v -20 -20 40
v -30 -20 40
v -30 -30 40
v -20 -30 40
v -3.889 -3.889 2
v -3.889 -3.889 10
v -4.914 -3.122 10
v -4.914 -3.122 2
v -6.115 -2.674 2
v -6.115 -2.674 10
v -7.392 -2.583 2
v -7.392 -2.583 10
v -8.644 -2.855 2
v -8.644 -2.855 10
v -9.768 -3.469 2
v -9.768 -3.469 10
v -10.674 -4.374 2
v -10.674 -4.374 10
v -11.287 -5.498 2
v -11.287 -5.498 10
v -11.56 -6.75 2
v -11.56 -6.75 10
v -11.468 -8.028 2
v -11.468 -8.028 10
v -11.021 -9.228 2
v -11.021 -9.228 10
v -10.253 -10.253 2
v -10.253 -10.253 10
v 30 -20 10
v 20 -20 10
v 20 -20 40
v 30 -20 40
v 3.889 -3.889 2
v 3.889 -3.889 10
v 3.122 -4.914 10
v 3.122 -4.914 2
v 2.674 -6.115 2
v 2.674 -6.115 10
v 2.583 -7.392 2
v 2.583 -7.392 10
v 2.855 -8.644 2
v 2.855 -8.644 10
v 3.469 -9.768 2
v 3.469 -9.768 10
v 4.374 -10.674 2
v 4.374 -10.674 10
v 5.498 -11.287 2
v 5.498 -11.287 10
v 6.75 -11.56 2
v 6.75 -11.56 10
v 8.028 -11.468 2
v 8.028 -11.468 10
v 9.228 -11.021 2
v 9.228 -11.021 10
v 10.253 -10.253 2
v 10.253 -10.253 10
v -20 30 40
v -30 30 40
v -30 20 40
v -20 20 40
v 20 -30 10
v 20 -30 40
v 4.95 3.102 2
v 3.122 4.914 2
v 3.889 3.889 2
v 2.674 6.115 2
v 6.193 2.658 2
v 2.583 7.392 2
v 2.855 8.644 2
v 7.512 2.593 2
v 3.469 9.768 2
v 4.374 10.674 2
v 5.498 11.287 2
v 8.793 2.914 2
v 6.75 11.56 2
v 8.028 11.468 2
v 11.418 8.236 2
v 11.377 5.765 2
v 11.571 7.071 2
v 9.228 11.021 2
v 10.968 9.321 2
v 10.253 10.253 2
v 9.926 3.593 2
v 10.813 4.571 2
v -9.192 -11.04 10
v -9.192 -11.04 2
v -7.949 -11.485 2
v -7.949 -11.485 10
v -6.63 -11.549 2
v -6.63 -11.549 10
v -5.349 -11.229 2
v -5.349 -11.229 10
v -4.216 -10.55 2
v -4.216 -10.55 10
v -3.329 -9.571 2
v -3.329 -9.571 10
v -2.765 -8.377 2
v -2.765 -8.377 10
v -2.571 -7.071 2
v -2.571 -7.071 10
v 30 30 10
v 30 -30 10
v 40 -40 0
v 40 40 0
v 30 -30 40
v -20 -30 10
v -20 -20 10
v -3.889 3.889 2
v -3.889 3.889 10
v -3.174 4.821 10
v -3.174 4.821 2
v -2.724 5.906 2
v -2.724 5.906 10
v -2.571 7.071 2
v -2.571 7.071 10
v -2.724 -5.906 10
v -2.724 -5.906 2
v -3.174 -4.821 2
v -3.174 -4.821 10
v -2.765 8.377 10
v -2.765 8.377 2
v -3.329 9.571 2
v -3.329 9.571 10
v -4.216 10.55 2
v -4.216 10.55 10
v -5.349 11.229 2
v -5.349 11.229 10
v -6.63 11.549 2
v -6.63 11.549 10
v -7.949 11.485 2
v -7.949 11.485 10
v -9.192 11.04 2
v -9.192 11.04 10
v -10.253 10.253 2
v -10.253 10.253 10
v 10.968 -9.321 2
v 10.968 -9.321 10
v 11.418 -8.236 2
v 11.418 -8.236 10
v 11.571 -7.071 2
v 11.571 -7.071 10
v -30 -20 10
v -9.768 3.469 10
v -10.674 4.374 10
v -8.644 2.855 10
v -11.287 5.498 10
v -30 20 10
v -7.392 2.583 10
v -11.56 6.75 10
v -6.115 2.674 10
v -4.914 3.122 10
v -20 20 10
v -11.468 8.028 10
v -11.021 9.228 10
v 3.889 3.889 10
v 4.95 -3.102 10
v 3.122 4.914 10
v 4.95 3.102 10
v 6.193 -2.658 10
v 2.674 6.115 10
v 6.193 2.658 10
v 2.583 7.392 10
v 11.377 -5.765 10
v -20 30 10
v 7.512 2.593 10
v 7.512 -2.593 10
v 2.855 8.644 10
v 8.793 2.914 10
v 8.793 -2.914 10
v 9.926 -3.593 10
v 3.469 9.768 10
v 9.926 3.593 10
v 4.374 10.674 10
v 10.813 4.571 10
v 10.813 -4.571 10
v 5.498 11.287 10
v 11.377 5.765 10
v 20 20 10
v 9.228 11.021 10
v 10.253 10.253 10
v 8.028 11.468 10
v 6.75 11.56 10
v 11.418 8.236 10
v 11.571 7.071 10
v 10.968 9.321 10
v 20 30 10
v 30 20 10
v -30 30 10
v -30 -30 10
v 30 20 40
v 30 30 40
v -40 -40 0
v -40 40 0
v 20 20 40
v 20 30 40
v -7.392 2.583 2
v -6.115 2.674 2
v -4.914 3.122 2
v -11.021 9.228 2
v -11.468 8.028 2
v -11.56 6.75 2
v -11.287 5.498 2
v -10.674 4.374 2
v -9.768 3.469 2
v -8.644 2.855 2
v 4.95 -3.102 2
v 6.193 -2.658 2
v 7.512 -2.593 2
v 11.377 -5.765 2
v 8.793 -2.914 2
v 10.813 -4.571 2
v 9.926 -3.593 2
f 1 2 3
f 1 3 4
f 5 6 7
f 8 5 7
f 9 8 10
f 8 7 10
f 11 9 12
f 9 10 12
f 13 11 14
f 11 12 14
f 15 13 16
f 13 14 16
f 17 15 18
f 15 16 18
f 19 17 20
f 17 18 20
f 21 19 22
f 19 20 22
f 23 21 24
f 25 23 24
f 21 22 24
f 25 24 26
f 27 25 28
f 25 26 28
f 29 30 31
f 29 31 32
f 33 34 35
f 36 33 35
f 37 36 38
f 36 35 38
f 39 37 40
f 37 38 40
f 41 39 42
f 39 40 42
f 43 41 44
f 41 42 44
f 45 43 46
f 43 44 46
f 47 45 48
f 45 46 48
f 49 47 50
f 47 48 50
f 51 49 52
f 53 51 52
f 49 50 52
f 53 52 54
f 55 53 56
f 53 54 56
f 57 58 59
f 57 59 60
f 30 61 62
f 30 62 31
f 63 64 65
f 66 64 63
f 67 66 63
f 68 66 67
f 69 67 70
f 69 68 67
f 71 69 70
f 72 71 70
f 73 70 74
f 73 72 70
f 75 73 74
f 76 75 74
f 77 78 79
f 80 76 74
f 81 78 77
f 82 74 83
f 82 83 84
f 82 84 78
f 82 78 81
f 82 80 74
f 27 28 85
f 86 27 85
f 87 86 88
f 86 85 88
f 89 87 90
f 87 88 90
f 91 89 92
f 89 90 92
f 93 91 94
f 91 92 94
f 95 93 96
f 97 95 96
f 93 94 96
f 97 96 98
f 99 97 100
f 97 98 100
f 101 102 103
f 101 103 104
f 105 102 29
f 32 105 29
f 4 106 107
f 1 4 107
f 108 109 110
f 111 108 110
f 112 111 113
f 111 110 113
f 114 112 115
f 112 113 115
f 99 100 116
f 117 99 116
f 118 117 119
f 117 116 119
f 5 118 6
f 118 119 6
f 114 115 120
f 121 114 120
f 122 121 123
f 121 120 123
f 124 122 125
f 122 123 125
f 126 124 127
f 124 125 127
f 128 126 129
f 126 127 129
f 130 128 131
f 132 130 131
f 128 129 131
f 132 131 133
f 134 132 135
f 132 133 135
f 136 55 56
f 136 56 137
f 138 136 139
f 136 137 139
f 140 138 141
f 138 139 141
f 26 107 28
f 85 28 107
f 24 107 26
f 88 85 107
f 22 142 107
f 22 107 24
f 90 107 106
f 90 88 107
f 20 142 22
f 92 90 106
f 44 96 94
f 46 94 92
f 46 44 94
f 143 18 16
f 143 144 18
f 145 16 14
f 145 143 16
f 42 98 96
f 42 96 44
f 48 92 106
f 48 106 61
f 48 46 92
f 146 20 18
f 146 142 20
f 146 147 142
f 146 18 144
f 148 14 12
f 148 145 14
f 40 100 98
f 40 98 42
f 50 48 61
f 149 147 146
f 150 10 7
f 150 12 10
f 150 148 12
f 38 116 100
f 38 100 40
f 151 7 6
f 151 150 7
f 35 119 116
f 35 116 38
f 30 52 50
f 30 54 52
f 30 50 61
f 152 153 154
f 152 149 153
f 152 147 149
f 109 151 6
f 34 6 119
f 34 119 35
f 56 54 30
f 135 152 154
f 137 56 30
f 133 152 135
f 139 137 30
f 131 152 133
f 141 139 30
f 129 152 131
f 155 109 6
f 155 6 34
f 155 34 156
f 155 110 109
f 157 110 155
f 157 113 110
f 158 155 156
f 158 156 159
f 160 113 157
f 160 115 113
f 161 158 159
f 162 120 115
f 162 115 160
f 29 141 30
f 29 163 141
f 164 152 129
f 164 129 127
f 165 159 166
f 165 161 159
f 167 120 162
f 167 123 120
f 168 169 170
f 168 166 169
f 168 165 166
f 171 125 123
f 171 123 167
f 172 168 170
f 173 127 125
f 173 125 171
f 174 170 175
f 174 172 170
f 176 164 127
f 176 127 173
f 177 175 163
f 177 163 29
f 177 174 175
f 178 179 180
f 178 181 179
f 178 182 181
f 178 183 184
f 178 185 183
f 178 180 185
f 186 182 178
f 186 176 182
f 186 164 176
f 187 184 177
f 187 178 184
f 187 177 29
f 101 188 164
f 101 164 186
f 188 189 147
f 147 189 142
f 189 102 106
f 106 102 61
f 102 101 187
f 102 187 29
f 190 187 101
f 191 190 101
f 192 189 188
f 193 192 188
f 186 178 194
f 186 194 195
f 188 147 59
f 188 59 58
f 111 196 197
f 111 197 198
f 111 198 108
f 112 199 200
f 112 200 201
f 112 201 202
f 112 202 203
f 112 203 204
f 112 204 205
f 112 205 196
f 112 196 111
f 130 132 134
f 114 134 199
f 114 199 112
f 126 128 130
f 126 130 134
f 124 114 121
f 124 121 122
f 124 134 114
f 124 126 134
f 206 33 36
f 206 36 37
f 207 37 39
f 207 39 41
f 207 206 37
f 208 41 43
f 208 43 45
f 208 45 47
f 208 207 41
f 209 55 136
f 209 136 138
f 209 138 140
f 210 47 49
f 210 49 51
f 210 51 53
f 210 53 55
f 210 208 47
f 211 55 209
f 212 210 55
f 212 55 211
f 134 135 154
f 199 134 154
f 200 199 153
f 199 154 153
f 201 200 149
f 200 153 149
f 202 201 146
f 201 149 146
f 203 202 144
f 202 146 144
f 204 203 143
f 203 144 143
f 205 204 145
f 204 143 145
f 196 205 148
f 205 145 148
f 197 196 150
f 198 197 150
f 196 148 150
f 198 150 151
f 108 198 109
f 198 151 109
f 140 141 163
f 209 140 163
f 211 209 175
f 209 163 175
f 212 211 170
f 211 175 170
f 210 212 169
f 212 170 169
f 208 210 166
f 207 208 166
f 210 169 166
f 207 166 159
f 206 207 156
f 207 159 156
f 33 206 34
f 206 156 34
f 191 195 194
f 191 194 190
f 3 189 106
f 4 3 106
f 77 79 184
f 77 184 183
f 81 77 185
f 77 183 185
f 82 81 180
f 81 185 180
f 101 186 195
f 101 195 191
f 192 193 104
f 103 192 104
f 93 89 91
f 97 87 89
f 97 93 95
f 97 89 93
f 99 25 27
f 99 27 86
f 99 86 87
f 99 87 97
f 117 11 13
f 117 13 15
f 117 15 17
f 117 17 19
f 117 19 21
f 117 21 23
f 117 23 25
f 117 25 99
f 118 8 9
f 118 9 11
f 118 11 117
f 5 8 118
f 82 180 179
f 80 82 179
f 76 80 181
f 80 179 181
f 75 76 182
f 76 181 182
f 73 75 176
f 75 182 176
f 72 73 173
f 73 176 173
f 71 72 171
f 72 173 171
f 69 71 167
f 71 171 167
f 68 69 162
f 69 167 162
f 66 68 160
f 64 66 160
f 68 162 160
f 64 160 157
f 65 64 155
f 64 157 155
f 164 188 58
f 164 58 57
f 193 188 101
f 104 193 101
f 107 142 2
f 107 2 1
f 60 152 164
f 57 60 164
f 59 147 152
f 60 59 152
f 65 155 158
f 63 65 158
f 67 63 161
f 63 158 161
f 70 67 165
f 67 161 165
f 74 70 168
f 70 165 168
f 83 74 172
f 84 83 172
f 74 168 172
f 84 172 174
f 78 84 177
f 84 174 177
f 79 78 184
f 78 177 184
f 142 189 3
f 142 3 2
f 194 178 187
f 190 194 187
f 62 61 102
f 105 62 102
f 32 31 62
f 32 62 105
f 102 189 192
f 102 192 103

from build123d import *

# Parameters (mm, degrees)
F0_W     = 80
F0_H     = 80
F1_DEPTH = 10
F2_SIZE2 = 9.99999
F2_SIZE  = 9.99999
F3_W     = 10
F3_H     = 10
F4_DEPTH = 30
F6_DEPTH = 8


# Not quite as in the source:
# - a fillet or chamfer is up to 0.001 mm smaller than in the source, because OpenCascade refuses the exact size


with BuildPart() as f1:
    # F0 (on Top) → F1 (new body)
    with BuildSketch(Plane.XY):
        Rectangle(F0_W, F0_H)
    extrude(amount=F1_DEPTH)

    # F2 (size 10 and 10 in the source; OpenCascade refuses exactly that, so slightly less here)
    f2_edges = [f1.edges().sort_by_distance(p)[0] for p in [
        (0, 40, 10),
        (-40, 0, 10),
        (0, -40, 10),
        (40, 0, 10),
    ]]
    chamfer(f2_edges, length=F2_SIZE, length2=F2_SIZE2)

    # F3 (on face) → F4 (join)
    with BuildSketch(Plane.XY.offset(10)):
        with Locations((-25, 25)):
            Rectangle(F3_W, F3_H)
        with Locations((-25, -25)):
            Rectangle(F3_W, F3_H)
        with Locations((25, 25)):
            Rectangle(F3_W, F3_H)
        with Locations((25, -25)):
            Rectangle(F3_W, F3_H)
    extrude(amount=F4_DEPTH)

    # F5 (on face) → F6 (cut)
    with BuildSketch(Plane.XY.offset(10)):
        with BuildLine():
            Line((-3.8890872965, 3.8890872965), (-10.2530483272, 10.2530483272))
            ThreePointArc((-10.2530483272, 10.2530483272), (-10.2530483272, 3.8890872965), (-3.8890872965, 3.8890872965))
        make_face()
        with BuildLine():
            ThreePointArc((-2.5710678119, 7.0710678119), (-5.3489923662, 11.2285257082), (-10.2530483272, 10.2530483272))
            Line((-10.2530483272, 10.2530483272), (-3.8890872965, 3.8890872965))
            ThreePointArc((-3.8890872965, 3.8890872965), (-2.9136099156, 5.3489923662), (-2.5710678119, 7.0710678119))
        make_face()
        with BuildLine():
            ThreePointArc((10.2530483272, 10.2530483272), (3.8890872965, 10.2530483272), (3.8890872965, 3.8890872965))
            Line((3.8890872965, 3.8890872965), (10.2530483272, 10.2530483272))
        make_face()
        with BuildLine():
            Line((10.2530483272, 10.2530483272), (3.8890872965, 3.8890872965))
            ThreePointArc((3.8890872965, 3.8890872965), (8.7931432575, 2.9136099156), (11.5710678119, 7.0710678119))
            ThreePointArc((11.5710678119, 7.0710678119), (11.2285257082, 8.7931432575), (10.2530483272, 10.2530483272))
        make_face()
        with BuildLine():
            Line((-10.2530483272, -10.2530483272), (-3.8890872965, -3.8890872965))
            ThreePointArc((-3.8890872965, -3.8890872965), (-10.2530483272, -3.8890872965), (-10.2530483272, -10.2530483272))
        make_face()
        with BuildLine():
            ThreePointArc((-2.5710678119, -7.0710678119), (-2.9136099156, -5.3489923662), (-3.8890872965, -3.8890872965))
            Line((-3.8890872965, -3.8890872965), (-10.2530483272, -10.2530483272))
            ThreePointArc((-10.2530483272, -10.2530483272), (-5.3489923662, -11.2285257082), (-2.5710678119, -7.0710678119))
        make_face()
        with BuildLine():
            Line((10.2530483272, -10.2530483272), (3.8890872965, -3.8890872965))
            ThreePointArc((3.8890872965, -3.8890872965), (3.8890872965, -10.2530483272), (10.2530483272, -10.2530483272))
        make_face()
        with BuildLine():
            ThreePointArc((11.5710678119, -7.0710678119), (8.7931432575, -2.9136099156), (3.8890872965, -3.8890872965))
            Line((3.8890872965, -3.8890872965), (10.2530483272, -10.2530483272))
            ThreePointArc((10.2530483272, -10.2530483272), (11.2285257082, -8.7931432575), (11.5710678119, -7.0710678119))
        make_face()
    extrude(amount=-F6_DEPTH, mode=Mode.SUBTRACT)


solid = f1.part
